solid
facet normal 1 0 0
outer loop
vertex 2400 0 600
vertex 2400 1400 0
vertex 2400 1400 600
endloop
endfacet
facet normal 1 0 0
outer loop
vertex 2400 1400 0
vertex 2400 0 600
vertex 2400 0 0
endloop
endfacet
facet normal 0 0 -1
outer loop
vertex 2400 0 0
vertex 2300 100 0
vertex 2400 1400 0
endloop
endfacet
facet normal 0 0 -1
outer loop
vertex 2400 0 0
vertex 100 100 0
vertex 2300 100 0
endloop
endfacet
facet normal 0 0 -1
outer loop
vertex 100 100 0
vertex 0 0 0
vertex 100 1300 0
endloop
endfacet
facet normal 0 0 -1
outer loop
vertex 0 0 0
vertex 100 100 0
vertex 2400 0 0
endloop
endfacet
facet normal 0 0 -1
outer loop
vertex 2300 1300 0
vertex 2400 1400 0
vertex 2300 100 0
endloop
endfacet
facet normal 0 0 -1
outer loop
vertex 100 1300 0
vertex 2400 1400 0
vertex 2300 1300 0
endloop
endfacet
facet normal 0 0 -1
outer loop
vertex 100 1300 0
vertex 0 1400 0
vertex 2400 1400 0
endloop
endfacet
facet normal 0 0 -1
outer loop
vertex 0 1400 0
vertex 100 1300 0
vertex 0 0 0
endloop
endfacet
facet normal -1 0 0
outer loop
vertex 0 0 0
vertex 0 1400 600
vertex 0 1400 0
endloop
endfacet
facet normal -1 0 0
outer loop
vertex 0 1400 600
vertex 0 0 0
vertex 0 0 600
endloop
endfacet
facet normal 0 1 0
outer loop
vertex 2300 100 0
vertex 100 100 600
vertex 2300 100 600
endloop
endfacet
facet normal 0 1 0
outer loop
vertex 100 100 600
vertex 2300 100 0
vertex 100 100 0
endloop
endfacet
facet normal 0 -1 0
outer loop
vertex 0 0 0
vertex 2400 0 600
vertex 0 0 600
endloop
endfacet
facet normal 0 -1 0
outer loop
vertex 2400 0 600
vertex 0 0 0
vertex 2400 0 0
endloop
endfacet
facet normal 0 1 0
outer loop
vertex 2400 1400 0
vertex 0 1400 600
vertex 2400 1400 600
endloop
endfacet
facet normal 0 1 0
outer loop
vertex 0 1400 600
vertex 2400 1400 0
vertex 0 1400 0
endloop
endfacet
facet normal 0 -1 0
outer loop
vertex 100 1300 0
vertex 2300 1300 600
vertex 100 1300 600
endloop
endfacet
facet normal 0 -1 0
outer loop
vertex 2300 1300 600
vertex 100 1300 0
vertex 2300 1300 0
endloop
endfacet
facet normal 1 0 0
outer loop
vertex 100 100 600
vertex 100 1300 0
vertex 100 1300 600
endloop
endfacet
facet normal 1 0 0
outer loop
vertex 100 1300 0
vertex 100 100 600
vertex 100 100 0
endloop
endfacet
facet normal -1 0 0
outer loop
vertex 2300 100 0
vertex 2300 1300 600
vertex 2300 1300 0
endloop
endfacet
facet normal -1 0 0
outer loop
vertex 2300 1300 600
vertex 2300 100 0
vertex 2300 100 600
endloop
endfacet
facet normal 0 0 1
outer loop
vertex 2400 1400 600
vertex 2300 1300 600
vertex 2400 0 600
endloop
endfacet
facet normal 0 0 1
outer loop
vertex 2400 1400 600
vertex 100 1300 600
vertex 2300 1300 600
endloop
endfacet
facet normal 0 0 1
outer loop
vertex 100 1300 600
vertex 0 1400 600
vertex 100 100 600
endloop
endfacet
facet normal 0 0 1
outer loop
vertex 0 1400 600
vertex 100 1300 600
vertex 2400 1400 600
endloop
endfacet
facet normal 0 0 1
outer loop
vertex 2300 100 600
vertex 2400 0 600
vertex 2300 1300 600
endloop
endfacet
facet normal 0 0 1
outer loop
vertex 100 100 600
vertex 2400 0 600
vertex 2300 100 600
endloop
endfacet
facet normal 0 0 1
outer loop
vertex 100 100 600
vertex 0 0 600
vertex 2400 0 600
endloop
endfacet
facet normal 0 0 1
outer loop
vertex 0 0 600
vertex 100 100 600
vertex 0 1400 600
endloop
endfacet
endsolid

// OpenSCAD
// Generated from plan.json; millimetres. Not a structural design.
// Open in OpenSCAD. Increase explode_mm to inspect courses.
explode_mm = 0;
$fn = 24;
show_fixing_paths = false;

// first-bed-01-C1-S
translate([0, 0, 0+0*explode_mm])
  color([0.70,0.52,0.33]) cube([2400, 100, 200]);
// first-bed-01-C1-N
translate([0, 1300, 0+0*explode_mm])
  color([0.70,0.52,0.33]) cube([2400, 100, 200]);
// first-bed-01-C1-W
translate([0, 100, 0+0*explode_mm])
  color([0.70,0.52,0.33]) cube([100, 1200, 200]);
// first-bed-01-C1-E
translate([2300, 100, 0+0*explode_mm])
  color([0.70,0.52,0.33]) cube([100, 1200, 200]);
// first-bed-01-C2-S
translate([0, 0, 200+1*explode_mm])
  color([0.70,0.52,0.33]) cube([2400, 100, 200]);
// first-bed-01-C2-N
translate([0, 1300, 200+1*explode_mm])
  color([0.70,0.52,0.33]) cube([2400, 100, 200]);
// first-bed-01-C2-W
translate([0, 100, 200+1*explode_mm])
  color([0.70,0.52,0.33]) cube([100, 1200, 200]);
// first-bed-01-C2-E
translate([2300, 100, 200+1*explode_mm])
  color([0.70,0.52,0.33]) cube([100, 1200, 200]);
// first-bed-01-C3-S
translate([0, 0, 400+2*explode_mm])
  color([0.70,0.52,0.33]) cube([2400, 100, 200]);
// first-bed-01-C3-N
translate([0, 1300, 400+2*explode_mm])
  color([0.70,0.52,0.33]) cube([2400, 100, 200]);
// first-bed-01-C3-W
translate([0, 100, 400+2*explode_mm])
  color([0.70,0.52,0.33]) cube([100, 1200, 200]);
// first-bed-01-C3-E
translate([2300, 100, 400+2*explode_mm])
  color([0.70,0.52,0.33]) cube([100, 1200, 200]);
if (show_fixing_paths) translate([50.0, 1400, 50.0+0*explode_mm]) rotate([90,0,0]) color([0.8,0.1,0.1]) cylinder(d=7, h=150);
if (show_fixing_paths) translate([50.0, 1400, 150.0+0*explode_mm]) rotate([90,0,0]) color([0.8,0.1,0.1]) cylinder(d=7, h=150);
if (show_fixing_paths) translate([2350.0, 1400, 50.0+0*explode_mm]) rotate([90,0,0]) color([0.8,0.1,0.1]) cylinder(d=7, h=150);
if (show_fixing_paths) translate([2350.0, 1400, 150.0+0*explode_mm]) rotate([90,0,0]) color([0.8,0.1,0.1]) cylinder(d=7, h=150);
if (show_fixing_paths) translate([50.0, 0, 50.0+0*explode_mm]) rotate([-90,0,0]) color([0.8,0.1,0.1]) cylinder(d=7, h=150);
if (show_fixing_paths) translate([50.0, 0, 150.0+0*explode_mm]) rotate([-90,0,0]) color([0.8,0.1,0.1]) cylinder(d=7, h=150);
if (show_fixing_paths) translate([2350.0, 0, 50.0+0*explode_mm]) rotate([-90,0,0]) color([0.8,0.1,0.1]) cylinder(d=7, h=150);
if (show_fixing_paths) translate([2350.0, 0, 150.0+0*explode_mm]) rotate([-90,0,0]) color([0.8,0.1,0.1]) cylinder(d=7, h=150);
if (show_fixing_paths) translate([2350.0, 300.0, 400+1*explode_mm]) rotate([180,0,0]) color([0.8,0.1,0.1]) cylinder(d=7, h=250);
if (show_fixing_paths) translate([2350.0, 700.0, 400+1*explode_mm]) rotate([180,0,0]) color([0.8,0.1,0.1]) cylinder(d=7, h=250);
if (show_fixing_paths) translate([2350.0, 1100.0, 400+1*explode_mm]) rotate([180,0,0]) color([0.8,0.1,0.1]) cylinder(d=7, h=250);
if (show_fixing_paths) translate([50.0, 1400, 250.0+1*explode_mm]) rotate([90,0,0]) color([0.8,0.1,0.1]) cylinder(d=7, h=150);
if (show_fixing_paths) translate([50.0, 1400, 350.0+1*explode_mm]) rotate([90,0,0]) color([0.8,0.1,0.1]) cylinder(d=7, h=150);
if (show_fixing_paths) translate([2350.0, 1400, 250.0+1*explode_mm]) rotate([90,0,0]) color([0.8,0.1,0.1]) cylinder(d=7, h=150);
if (show_fixing_paths) translate([2350.0, 1400, 350.0+1*explode_mm]) rotate([90,0,0]) color([0.8,0.1,0.1]) cylinder(d=7, h=150);
if (show_fixing_paths) translate([200.0, 1350.0, 400+1*explode_mm]) rotate([180,0,0]) color([0.8,0.1,0.1]) cylinder(d=7, h=250);
if (show_fixing_paths) translate([700.0, 1350.0, 400+1*explode_mm]) rotate([180,0,0]) color([0.8,0.1,0.1]) cylinder(d=7, h=250);
if (show_fixing_paths) translate([1200.0, 1350.0, 400+1*explode_mm]) rotate([180,0,0]) color([0.8,0.1,0.1]) cylinder(d=7, h=250);
if (show_fixing_paths) translate([1700.0, 1350.0, 400+1*explode_mm]) rotate([180,0,0]) color([0.8,0.1,0.1]) cylinder(d=7, h=250);
if (show_fixing_paths) translate([2200.0, 1350.0, 400+1*explode_mm]) rotate([180,0,0]) color([0.8,0.1,0.1]) cylinder(d=7, h=250);
if (show_fixing_paths) translate([50.0, 0, 250.0+1*explode_mm]) rotate([-90,0,0]) color([0.8,0.1,0.1]) cylinder(d=7, h=150);
if (show_fixing_paths) translate([50.0, 0, 350.0+1*explode_mm]) rotate([-90,0,0]) color([0.8,0.1,0.1]) cylinder(d=7, h=150);
if (show_fixing_paths) translate([2350.0, 0, 250.0+1*explode_mm]) rotate([-90,0,0]) color([0.8,0.1,0.1]) cylinder(d=7, h=150);
if (show_fixing_paths) translate([2350.0, 0, 350.0+1*explode_mm]) rotate([-90,0,0]) color([0.8,0.1,0.1]) cylinder(d=7, h=150);
if (show_fixing_paths) translate([200.0, 50.0, 400+1*explode_mm]) rotate([180,0,0]) color([0.8,0.1,0.1]) cylinder(d=7, h=250);
if (show_fixing_paths) translate([700.0, 50.0, 400+1*explode_mm]) rotate([180,0,0]) color([0.8,0.1,0.1]) cylinder(d=7, h=250);
if (show_fixing_paths) translate([1200.0, 50.0, 400+1*explode_mm]) rotate([180,0,0]) color([0.8,0.1,0.1]) cylinder(d=7, h=250);
if (show_fixing_paths) translate([1700.0, 50.0, 400+1*explode_mm]) rotate([180,0,0]) color([0.8,0.1,0.1]) cylinder(d=7, h=250);
if (show_fixing_paths) translate([2200.0, 50.0, 400+1*explode_mm]) rotate([180,0,0]) color([0.8,0.1,0.1]) cylinder(d=7, h=250);
if (show_fixing_paths) translate([50.0, 300.0, 400+1*explode_mm]) rotate([180,0,0]) color([0.8,0.1,0.1]) cylinder(d=7, h=250);
if (show_fixing_paths) translate([50.0, 700.0, 400+1*explode_mm]) rotate([180,0,0]) color([0.8,0.1,0.1]) cylinder(d=7, h=250);
if (show_fixing_paths) translate([50.0, 1100.0, 400+1*explode_mm]) rotate([180,0,0]) color([0.8,0.1,0.1]) cylinder(d=7, h=250);
if (show_fixing_paths) translate([2350.0, 340.0, 600+2*explode_mm]) rotate([180,0,0]) color([0.8,0.1,0.1]) cylinder(d=7, h=250);
if (show_fixing_paths) translate([2350.0, 740.0, 600+2*explode_mm]) rotate([180,0,0]) color([0.8,0.1,0.1]) cylinder(d=7, h=250);
if (show_fixing_paths) translate([2350.0, 1140.0, 600+2*explode_mm]) rotate([180,0,0]) color([0.8,0.1,0.1]) cylinder(d=7, h=250);
if (show_fixing_paths) translate([50.0, 1400, 450.0+2*explode_mm]) rotate([90,0,0]) color([0.8,0.1,0.1]) cylinder(d=7, h=150);
if (show_fixing_paths) translate([50.0, 1400, 550.0+2*explode_mm]) rotate([90,0,0]) color([0.8,0.1,0.1]) cylinder(d=7, h=150);
if (show_fixing_paths) translate([2350.0, 1400, 450.0+2*explode_mm]) rotate([90,0,0]) color([0.8,0.1,0.1]) cylinder(d=7, h=150);
if (show_fixing_paths) translate([2350.0, 1400, 550.0+2*explode_mm]) rotate([90,0,0]) color([0.8,0.1,0.1]) cylinder(d=7, h=150);
if (show_fixing_paths) translate([240.0, 1350.0, 600+2*explode_mm]) rotate([180,0,0]) color([0.8,0.1,0.1]) cylinder(d=7, h=250);
if (show_fixing_paths) translate([740.0, 1350.0, 600+2*explode_mm]) rotate([180,0,0]) color([0.8,0.1,0.1]) cylinder(d=7, h=250);
if (show_fixing_paths) translate([1240.0, 1350.0, 600+2*explode_mm]) rotate([180,0,0]) color([0.8,0.1,0.1]) cylinder(d=7, h=250);
if (show_fixing_paths) translate([1740.0, 1350.0, 600+2*explode_mm]) rotate([180,0,0]) color([0.8,0.1,0.1]) cylinder(d=7, h=250);
if (show_fixing_paths) translate([2240.0, 1350.0, 600+2*explode_mm]) rotate([180,0,0]) color([0.8,0.1,0.1]) cylinder(d=7, h=250);
if (show_fixing_paths) translate([50.0, 0, 450.0+2*explode_mm]) rotate([-90,0,0]) color([0.8,0.1,0.1]) cylinder(d=7, h=150);
if (show_fixing_paths) translate([50.0, 0, 550.0+2*explode_mm]) rotate([-90,0,0]) color([0.8,0.1,0.1]) cylinder(d=7, h=150);
if (show_fixing_paths) translate([2350.0, 0, 450.0+2*explode_mm]) rotate([-90,0,0]) color([0.8,0.1,0.1]) cylinder(d=7, h=150);
if (show_fixing_paths) translate([2350.0, 0, 550.0+2*explode_mm]) rotate([-90,0,0]) color([0.8,0.1,0.1]) cylinder(d=7, h=150);
if (show_fixing_paths) translate([240.0, 50.0, 600+2*explode_mm]) rotate([180,0,0]) color([0.8,0.1,0.1]) cylinder(d=7, h=250);
if (show_fixing_paths) translate([740.0, 50.0, 600+2*explode_mm]) rotate([180,0,0]) color([0.8,0.1,0.1]) cylinder(d=7, h=250);
if (show_fixing_paths) translate([1240.0, 50.0, 600+2*explode_mm]) rotate([180,0,0]) color([0.8,0.1,0.1]) cylinder(d=7, h=250);
if (show_fixing_paths) translate([1740.0, 50.0, 600+2*explode_mm]) rotate([180,0,0]) color([0.8,0.1,0.1]) cylinder(d=7, h=250);
if (show_fixing_paths) translate([2240.0, 50.0, 600+2*explode_mm]) rotate([180,0,0]) color([0.8,0.1,0.1]) cylinder(d=7, h=250);
if (show_fixing_paths) translate([50.0, 340.0, 600+2*explode_mm]) rotate([180,0,0]) color([0.8,0.1,0.1]) cylinder(d=7, h=250);
if (show_fixing_paths) translate([50.0, 740.0, 600+2*explode_mm]) rotate([180,0,0]) color([0.8,0.1,0.1]) cylinder(d=7, h=250);
if (show_fixing_paths) translate([50.0, 1140.0, 600+2*explode_mm]) rotate([180,0,0]) color([0.8,0.1,0.1]) cylinder(d=7, h=250);
